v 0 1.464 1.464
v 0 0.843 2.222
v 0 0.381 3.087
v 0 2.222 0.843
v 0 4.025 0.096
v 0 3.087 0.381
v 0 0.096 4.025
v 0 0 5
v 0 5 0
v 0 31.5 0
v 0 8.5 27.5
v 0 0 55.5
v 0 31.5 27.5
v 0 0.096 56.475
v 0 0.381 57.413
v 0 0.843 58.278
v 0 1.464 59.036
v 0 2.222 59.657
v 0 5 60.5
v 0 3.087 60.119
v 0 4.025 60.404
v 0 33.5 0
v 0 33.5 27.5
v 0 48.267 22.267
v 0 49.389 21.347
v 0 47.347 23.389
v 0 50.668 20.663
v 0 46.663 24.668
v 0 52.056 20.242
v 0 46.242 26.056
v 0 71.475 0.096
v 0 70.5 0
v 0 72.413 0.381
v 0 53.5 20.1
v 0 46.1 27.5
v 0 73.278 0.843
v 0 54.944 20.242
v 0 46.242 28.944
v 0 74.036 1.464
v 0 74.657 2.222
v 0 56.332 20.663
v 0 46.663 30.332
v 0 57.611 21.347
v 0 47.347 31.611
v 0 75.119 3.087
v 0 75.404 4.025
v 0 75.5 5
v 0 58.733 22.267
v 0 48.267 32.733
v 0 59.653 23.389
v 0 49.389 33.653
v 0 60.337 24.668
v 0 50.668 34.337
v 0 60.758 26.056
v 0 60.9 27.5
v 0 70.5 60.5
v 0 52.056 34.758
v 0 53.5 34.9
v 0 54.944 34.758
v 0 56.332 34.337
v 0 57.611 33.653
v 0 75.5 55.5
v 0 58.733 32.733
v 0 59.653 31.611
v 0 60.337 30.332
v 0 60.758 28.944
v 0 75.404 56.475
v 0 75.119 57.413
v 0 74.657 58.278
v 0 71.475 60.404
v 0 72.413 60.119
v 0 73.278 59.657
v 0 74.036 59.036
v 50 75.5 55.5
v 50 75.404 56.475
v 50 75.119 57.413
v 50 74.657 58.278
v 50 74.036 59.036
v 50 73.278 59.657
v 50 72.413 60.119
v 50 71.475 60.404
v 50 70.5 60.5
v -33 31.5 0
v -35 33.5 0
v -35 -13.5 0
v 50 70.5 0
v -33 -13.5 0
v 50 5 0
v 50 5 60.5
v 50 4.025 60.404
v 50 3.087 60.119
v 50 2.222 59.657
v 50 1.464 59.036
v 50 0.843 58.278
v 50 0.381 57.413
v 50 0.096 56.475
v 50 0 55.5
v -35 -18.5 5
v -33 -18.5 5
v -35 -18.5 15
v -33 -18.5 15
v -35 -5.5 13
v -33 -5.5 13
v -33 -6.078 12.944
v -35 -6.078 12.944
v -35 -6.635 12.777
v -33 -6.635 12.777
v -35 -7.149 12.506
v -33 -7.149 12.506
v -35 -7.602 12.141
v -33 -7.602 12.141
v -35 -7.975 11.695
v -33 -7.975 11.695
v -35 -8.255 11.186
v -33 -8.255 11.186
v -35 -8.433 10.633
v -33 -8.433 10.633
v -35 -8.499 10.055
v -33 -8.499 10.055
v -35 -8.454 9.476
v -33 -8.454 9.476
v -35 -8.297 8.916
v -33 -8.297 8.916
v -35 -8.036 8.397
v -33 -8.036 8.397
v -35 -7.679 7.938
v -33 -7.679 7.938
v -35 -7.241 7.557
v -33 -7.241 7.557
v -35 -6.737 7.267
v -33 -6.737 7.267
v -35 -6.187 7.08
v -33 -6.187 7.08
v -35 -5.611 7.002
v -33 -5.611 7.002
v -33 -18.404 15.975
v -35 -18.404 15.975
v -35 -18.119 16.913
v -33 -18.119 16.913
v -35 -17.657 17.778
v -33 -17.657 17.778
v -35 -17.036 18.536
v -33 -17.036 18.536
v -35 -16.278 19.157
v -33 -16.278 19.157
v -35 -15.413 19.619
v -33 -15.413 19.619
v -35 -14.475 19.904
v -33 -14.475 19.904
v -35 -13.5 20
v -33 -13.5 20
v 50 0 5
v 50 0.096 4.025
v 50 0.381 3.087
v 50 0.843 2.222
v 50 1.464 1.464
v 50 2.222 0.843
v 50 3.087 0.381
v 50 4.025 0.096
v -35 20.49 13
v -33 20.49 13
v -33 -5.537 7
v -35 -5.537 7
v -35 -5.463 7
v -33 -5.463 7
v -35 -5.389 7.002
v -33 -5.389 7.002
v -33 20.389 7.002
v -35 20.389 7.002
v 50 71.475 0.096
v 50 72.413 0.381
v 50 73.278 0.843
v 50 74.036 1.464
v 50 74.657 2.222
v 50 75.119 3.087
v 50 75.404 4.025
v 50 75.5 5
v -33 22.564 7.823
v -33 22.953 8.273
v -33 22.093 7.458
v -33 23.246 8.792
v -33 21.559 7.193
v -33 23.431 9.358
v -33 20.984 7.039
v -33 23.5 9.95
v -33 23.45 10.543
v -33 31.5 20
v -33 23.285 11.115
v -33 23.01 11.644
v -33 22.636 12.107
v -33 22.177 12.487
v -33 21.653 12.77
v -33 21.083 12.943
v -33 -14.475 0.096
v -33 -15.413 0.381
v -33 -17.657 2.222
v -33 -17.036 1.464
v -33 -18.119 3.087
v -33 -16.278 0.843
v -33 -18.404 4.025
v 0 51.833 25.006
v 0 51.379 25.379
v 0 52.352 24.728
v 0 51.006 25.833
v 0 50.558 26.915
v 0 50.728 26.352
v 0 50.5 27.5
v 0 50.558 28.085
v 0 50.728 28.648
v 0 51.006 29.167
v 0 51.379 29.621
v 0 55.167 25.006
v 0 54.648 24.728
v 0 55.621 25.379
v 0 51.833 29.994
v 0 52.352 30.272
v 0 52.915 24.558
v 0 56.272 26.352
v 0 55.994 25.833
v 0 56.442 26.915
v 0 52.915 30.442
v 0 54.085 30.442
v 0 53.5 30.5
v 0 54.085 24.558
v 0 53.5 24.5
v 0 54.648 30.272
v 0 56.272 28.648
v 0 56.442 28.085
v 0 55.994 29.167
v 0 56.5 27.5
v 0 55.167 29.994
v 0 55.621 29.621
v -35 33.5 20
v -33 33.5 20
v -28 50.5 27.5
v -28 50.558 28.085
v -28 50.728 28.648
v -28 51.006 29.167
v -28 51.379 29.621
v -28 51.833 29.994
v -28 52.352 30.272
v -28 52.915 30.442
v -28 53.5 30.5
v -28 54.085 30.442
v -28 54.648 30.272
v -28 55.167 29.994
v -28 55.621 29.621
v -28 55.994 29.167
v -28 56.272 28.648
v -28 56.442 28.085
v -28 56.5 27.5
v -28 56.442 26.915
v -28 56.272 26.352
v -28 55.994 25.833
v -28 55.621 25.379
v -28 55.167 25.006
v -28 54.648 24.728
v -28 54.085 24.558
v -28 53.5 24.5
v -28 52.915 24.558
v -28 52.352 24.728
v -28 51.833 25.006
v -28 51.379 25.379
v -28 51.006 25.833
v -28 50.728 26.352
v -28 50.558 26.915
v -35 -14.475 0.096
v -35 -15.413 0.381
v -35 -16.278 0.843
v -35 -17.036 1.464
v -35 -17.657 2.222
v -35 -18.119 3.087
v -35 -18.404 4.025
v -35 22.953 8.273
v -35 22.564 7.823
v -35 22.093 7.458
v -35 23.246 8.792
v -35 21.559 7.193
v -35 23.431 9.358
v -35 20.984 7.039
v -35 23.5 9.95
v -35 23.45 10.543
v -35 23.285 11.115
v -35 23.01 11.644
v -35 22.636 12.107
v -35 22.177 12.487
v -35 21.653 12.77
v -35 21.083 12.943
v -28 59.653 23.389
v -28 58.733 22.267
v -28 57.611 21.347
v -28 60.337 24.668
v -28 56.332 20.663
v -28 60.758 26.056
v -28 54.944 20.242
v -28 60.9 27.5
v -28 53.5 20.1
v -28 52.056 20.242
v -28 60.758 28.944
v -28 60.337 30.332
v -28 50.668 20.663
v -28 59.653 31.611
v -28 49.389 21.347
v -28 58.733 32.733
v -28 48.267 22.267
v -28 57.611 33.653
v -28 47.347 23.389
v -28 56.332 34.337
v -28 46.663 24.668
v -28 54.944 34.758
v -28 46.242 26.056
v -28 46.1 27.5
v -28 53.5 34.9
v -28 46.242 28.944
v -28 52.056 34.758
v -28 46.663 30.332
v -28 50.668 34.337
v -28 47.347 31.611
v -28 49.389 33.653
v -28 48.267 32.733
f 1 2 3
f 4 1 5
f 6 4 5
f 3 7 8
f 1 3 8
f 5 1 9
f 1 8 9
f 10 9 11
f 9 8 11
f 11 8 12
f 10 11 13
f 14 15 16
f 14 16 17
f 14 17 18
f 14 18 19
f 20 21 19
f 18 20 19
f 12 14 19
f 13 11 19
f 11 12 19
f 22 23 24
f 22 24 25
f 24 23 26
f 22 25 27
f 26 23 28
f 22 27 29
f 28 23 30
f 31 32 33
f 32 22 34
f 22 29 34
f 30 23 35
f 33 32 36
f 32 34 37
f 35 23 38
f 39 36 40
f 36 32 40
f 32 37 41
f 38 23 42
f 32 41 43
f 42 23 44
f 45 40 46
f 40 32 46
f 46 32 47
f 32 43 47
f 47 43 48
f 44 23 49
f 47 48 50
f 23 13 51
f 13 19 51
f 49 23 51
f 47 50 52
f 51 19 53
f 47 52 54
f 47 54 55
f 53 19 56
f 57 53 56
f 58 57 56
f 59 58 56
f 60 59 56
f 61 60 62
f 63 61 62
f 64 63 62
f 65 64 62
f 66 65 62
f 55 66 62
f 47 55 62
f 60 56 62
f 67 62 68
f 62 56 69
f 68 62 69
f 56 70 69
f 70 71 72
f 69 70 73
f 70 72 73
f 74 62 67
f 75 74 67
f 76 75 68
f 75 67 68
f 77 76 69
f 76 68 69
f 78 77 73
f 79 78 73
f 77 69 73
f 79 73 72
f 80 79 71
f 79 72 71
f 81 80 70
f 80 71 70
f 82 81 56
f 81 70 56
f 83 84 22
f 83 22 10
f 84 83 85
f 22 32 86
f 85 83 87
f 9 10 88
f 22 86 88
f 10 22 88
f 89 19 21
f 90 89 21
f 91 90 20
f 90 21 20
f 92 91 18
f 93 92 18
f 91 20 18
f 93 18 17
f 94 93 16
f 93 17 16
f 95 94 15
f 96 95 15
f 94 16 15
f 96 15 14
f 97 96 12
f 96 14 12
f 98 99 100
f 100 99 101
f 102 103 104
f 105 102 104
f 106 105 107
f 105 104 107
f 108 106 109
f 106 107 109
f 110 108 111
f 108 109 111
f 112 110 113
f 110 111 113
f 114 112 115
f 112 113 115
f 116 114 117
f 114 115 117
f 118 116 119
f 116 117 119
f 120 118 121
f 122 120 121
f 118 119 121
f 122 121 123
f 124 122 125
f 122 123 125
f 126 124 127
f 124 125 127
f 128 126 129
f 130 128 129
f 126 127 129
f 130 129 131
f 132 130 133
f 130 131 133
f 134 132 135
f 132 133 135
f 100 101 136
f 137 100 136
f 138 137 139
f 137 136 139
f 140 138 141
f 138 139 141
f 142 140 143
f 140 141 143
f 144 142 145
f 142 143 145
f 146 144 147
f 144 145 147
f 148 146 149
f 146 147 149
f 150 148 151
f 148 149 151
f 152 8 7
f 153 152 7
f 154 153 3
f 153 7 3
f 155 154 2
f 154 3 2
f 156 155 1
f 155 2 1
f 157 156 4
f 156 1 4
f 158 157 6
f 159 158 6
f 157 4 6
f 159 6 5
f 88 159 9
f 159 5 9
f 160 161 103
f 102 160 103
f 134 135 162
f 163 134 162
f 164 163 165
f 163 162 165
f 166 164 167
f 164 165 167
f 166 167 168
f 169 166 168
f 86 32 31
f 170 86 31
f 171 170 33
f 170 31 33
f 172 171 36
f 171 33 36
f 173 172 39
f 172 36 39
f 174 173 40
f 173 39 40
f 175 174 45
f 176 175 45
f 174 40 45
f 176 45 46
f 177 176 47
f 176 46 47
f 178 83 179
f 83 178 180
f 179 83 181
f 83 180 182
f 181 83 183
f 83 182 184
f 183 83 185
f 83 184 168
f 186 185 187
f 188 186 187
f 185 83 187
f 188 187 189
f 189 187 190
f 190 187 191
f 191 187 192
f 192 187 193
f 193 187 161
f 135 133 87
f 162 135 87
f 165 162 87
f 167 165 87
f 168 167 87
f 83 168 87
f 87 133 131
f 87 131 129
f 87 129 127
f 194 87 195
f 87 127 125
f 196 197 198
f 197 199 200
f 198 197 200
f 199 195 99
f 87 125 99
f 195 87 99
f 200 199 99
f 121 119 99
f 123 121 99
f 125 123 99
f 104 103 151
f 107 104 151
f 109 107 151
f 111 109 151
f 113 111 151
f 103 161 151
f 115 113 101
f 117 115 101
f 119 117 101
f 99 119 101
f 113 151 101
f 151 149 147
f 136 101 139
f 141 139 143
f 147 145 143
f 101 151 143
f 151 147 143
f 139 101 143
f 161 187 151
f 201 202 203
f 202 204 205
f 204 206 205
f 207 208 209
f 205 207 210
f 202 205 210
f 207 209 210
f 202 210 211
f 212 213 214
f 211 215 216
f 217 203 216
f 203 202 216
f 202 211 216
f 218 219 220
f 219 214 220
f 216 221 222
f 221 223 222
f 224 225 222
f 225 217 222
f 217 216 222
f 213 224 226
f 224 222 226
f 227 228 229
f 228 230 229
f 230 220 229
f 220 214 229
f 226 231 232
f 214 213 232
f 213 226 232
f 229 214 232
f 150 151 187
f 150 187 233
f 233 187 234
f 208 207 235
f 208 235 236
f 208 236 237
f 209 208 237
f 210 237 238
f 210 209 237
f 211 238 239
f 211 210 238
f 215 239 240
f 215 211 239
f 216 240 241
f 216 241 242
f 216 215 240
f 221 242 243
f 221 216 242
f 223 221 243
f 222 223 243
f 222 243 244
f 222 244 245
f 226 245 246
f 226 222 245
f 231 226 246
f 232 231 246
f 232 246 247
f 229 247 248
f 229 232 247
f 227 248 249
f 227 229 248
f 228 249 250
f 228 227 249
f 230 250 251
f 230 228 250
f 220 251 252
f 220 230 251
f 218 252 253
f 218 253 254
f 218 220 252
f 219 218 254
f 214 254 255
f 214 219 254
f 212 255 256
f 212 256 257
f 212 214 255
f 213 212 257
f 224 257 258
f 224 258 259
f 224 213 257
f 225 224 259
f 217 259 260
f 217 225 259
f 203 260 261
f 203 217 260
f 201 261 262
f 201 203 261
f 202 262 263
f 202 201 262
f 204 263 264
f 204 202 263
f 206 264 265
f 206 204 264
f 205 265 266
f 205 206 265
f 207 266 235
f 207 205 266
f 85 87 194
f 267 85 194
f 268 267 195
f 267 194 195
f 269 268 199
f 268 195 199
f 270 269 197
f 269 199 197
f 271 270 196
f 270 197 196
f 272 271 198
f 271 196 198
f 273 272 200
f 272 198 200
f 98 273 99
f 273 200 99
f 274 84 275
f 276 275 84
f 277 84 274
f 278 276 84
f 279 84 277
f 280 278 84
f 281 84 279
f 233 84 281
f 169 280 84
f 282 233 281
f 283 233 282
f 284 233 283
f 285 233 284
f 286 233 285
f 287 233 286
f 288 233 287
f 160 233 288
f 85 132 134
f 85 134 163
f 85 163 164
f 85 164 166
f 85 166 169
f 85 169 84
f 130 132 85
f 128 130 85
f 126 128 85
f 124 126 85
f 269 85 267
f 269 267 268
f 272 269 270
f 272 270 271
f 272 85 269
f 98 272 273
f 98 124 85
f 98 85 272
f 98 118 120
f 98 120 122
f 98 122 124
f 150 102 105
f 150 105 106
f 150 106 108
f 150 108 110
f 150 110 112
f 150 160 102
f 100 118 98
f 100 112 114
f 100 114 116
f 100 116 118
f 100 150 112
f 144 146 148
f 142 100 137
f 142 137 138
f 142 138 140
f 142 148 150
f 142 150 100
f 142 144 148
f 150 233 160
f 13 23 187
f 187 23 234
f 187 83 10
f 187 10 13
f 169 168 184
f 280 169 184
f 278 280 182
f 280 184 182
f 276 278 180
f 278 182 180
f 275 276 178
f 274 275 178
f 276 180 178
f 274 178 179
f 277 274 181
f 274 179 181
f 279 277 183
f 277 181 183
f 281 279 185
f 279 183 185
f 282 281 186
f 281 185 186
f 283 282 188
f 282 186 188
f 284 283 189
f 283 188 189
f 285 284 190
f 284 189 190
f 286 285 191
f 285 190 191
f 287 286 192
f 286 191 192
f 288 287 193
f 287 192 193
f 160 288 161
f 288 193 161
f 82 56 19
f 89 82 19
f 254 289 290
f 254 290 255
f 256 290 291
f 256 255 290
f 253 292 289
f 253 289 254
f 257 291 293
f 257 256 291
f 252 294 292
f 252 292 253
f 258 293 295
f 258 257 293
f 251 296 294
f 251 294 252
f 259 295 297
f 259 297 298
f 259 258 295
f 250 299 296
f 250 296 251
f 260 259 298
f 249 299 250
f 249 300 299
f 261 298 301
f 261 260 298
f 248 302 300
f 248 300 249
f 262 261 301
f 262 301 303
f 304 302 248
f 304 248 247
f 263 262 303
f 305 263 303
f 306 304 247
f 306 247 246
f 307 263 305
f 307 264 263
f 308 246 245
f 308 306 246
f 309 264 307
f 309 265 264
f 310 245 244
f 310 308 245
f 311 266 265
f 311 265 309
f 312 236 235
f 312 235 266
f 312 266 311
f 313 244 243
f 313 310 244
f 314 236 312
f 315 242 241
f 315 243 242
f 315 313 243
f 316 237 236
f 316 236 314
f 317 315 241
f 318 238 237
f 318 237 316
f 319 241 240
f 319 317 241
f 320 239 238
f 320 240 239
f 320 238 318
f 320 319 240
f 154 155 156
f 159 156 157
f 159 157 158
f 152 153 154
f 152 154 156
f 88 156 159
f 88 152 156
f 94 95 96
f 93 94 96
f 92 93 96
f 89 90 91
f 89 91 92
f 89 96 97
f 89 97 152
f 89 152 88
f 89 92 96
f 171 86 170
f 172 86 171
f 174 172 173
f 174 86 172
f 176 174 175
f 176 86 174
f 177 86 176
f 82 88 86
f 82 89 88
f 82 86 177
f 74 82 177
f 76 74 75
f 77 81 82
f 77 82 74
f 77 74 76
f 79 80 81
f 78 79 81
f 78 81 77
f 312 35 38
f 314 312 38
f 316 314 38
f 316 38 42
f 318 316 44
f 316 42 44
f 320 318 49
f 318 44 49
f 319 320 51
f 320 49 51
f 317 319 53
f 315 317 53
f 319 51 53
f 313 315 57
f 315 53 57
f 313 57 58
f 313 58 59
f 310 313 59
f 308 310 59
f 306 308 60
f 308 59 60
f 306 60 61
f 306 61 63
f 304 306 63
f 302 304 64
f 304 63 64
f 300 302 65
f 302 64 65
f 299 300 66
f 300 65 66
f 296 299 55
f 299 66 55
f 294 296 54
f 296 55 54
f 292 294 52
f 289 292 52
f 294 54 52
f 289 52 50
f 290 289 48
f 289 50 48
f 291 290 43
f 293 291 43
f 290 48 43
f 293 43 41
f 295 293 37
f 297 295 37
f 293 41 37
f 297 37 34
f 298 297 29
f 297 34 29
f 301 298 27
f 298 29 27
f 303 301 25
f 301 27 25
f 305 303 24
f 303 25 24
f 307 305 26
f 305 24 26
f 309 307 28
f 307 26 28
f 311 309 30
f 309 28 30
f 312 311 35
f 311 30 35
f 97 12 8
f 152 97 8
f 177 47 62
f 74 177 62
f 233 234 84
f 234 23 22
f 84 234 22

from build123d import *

# Parameters (mm, degrees)
F1_DEPTH = 50
F2_R     = 7.4
F2_R_2   = 3
F3_DEPTH = 28
F4_W     = 2
F4_H     = 27.5
F5_DEPTH = 33
F7_DEPTH = 2
F9_DEPTH = 25


with BuildPart() as f1:
    # F0 (on Right) → F1 (new body)
    with BuildSketch(Plane.YZ):
        with BuildLine():
            ThreePointArc((0, 5), (1.464466, 1.464466), (5, 0))
            Line((5, 0), (70.5, 0))
            ThreePointArc((70.5, 0), (74.035534, 1.464466), (75.5, 5))
            Line((75.5, 5), (75.5, 55.5))
            ThreePointArc((75.5, 55.5), (74.035534, 59.035534), (70.5, 60.5))
            Line((70.5, 60.5), (5, 60.5))
            ThreePointArc((5, 60.5), (1.464466, 59.035534), (0, 55.5))
            Line((0, 55.5), (0, 5))
        make_face()
    extrude(amount=F1_DEPTH)

    # F2 (on face) → F3 (join)
    with BuildSketch(Plane(origin=(0, 0, 0), x_dir=(0, -1, 0), z_dir=(-1, 0, 0))):
        with Locations((-53.5, 27.5)):
            Circle(F2_R)
        with Locations((-53.5, 27.5)):
            Circle(F2_R_2, mode=Mode.SUBTRACT)
    extrude(amount=F3_DEPTH)

    # F4 (on face) → F5 (join)
    with BuildSketch(Plane(origin=(0, 0, 0), x_dir=(0, -1, 0), z_dir=(-1, 0, 0))):
        with Locations((-32.5, 13.75)):
            Rectangle(F4_W, F4_H)
    extrude(amount=F5_DEPTH)

    # F6 (on face) → F7 (join)
    with BuildSketch(Plane(origin=(-33, 0, 0), x_dir=(0, -1, 0), z_dir=(-1, 0, 0))):
        with BuildLine():
            Line((-33.5, 20), (-33.5, 0))
            Line((-33.5, 0), (13.5, 0))
            ThreePointArc((13.5, 0), (17.035534, 1.464466), (18.5, 5))
            Line((18.5, 5), (18.5, 15))
            ThreePointArc((18.5, 15), (17.035534, 18.535534), (13.5, 20))
            Line((13.5, 20), (-33.5, 20))
        make_face()
        with BuildLine():
            ThreePointArc((5.610631, 7.002041), (5.5, 7), (5.389369, 7.002041))
            Line((5.389369, 7.002041), (-20.389369, 7.002041))
            ThreePointArc((-20.389369, 7.002041), (-23.499577, 9.949607), (-20.490135, 12.999984))
            Line((-20.490135, 12.999984), (5.499998, 13))
            ThreePointArc((5.499998, 13), (8.49949, 10.055326), (5.610631, 7.002041))
        make_face(mode=Mode.SUBTRACT)
    extrude(amount=F7_DEPTH)

    # F8 (on face) → F9 (cut)
    with BuildSketch(Plane(origin=(0, 33.5, 0), x_dir=(-1, 0, 0), z_dir=(0, 1, 0))):
        Polygon((0, 27.5), (33, 20), (42.120021, 30.809933), (19.240811, 38.767923), align=None)
    extrude(amount=-F9_DEPTH, mode=Mode.SUBTRACT)


solid = f1.part
